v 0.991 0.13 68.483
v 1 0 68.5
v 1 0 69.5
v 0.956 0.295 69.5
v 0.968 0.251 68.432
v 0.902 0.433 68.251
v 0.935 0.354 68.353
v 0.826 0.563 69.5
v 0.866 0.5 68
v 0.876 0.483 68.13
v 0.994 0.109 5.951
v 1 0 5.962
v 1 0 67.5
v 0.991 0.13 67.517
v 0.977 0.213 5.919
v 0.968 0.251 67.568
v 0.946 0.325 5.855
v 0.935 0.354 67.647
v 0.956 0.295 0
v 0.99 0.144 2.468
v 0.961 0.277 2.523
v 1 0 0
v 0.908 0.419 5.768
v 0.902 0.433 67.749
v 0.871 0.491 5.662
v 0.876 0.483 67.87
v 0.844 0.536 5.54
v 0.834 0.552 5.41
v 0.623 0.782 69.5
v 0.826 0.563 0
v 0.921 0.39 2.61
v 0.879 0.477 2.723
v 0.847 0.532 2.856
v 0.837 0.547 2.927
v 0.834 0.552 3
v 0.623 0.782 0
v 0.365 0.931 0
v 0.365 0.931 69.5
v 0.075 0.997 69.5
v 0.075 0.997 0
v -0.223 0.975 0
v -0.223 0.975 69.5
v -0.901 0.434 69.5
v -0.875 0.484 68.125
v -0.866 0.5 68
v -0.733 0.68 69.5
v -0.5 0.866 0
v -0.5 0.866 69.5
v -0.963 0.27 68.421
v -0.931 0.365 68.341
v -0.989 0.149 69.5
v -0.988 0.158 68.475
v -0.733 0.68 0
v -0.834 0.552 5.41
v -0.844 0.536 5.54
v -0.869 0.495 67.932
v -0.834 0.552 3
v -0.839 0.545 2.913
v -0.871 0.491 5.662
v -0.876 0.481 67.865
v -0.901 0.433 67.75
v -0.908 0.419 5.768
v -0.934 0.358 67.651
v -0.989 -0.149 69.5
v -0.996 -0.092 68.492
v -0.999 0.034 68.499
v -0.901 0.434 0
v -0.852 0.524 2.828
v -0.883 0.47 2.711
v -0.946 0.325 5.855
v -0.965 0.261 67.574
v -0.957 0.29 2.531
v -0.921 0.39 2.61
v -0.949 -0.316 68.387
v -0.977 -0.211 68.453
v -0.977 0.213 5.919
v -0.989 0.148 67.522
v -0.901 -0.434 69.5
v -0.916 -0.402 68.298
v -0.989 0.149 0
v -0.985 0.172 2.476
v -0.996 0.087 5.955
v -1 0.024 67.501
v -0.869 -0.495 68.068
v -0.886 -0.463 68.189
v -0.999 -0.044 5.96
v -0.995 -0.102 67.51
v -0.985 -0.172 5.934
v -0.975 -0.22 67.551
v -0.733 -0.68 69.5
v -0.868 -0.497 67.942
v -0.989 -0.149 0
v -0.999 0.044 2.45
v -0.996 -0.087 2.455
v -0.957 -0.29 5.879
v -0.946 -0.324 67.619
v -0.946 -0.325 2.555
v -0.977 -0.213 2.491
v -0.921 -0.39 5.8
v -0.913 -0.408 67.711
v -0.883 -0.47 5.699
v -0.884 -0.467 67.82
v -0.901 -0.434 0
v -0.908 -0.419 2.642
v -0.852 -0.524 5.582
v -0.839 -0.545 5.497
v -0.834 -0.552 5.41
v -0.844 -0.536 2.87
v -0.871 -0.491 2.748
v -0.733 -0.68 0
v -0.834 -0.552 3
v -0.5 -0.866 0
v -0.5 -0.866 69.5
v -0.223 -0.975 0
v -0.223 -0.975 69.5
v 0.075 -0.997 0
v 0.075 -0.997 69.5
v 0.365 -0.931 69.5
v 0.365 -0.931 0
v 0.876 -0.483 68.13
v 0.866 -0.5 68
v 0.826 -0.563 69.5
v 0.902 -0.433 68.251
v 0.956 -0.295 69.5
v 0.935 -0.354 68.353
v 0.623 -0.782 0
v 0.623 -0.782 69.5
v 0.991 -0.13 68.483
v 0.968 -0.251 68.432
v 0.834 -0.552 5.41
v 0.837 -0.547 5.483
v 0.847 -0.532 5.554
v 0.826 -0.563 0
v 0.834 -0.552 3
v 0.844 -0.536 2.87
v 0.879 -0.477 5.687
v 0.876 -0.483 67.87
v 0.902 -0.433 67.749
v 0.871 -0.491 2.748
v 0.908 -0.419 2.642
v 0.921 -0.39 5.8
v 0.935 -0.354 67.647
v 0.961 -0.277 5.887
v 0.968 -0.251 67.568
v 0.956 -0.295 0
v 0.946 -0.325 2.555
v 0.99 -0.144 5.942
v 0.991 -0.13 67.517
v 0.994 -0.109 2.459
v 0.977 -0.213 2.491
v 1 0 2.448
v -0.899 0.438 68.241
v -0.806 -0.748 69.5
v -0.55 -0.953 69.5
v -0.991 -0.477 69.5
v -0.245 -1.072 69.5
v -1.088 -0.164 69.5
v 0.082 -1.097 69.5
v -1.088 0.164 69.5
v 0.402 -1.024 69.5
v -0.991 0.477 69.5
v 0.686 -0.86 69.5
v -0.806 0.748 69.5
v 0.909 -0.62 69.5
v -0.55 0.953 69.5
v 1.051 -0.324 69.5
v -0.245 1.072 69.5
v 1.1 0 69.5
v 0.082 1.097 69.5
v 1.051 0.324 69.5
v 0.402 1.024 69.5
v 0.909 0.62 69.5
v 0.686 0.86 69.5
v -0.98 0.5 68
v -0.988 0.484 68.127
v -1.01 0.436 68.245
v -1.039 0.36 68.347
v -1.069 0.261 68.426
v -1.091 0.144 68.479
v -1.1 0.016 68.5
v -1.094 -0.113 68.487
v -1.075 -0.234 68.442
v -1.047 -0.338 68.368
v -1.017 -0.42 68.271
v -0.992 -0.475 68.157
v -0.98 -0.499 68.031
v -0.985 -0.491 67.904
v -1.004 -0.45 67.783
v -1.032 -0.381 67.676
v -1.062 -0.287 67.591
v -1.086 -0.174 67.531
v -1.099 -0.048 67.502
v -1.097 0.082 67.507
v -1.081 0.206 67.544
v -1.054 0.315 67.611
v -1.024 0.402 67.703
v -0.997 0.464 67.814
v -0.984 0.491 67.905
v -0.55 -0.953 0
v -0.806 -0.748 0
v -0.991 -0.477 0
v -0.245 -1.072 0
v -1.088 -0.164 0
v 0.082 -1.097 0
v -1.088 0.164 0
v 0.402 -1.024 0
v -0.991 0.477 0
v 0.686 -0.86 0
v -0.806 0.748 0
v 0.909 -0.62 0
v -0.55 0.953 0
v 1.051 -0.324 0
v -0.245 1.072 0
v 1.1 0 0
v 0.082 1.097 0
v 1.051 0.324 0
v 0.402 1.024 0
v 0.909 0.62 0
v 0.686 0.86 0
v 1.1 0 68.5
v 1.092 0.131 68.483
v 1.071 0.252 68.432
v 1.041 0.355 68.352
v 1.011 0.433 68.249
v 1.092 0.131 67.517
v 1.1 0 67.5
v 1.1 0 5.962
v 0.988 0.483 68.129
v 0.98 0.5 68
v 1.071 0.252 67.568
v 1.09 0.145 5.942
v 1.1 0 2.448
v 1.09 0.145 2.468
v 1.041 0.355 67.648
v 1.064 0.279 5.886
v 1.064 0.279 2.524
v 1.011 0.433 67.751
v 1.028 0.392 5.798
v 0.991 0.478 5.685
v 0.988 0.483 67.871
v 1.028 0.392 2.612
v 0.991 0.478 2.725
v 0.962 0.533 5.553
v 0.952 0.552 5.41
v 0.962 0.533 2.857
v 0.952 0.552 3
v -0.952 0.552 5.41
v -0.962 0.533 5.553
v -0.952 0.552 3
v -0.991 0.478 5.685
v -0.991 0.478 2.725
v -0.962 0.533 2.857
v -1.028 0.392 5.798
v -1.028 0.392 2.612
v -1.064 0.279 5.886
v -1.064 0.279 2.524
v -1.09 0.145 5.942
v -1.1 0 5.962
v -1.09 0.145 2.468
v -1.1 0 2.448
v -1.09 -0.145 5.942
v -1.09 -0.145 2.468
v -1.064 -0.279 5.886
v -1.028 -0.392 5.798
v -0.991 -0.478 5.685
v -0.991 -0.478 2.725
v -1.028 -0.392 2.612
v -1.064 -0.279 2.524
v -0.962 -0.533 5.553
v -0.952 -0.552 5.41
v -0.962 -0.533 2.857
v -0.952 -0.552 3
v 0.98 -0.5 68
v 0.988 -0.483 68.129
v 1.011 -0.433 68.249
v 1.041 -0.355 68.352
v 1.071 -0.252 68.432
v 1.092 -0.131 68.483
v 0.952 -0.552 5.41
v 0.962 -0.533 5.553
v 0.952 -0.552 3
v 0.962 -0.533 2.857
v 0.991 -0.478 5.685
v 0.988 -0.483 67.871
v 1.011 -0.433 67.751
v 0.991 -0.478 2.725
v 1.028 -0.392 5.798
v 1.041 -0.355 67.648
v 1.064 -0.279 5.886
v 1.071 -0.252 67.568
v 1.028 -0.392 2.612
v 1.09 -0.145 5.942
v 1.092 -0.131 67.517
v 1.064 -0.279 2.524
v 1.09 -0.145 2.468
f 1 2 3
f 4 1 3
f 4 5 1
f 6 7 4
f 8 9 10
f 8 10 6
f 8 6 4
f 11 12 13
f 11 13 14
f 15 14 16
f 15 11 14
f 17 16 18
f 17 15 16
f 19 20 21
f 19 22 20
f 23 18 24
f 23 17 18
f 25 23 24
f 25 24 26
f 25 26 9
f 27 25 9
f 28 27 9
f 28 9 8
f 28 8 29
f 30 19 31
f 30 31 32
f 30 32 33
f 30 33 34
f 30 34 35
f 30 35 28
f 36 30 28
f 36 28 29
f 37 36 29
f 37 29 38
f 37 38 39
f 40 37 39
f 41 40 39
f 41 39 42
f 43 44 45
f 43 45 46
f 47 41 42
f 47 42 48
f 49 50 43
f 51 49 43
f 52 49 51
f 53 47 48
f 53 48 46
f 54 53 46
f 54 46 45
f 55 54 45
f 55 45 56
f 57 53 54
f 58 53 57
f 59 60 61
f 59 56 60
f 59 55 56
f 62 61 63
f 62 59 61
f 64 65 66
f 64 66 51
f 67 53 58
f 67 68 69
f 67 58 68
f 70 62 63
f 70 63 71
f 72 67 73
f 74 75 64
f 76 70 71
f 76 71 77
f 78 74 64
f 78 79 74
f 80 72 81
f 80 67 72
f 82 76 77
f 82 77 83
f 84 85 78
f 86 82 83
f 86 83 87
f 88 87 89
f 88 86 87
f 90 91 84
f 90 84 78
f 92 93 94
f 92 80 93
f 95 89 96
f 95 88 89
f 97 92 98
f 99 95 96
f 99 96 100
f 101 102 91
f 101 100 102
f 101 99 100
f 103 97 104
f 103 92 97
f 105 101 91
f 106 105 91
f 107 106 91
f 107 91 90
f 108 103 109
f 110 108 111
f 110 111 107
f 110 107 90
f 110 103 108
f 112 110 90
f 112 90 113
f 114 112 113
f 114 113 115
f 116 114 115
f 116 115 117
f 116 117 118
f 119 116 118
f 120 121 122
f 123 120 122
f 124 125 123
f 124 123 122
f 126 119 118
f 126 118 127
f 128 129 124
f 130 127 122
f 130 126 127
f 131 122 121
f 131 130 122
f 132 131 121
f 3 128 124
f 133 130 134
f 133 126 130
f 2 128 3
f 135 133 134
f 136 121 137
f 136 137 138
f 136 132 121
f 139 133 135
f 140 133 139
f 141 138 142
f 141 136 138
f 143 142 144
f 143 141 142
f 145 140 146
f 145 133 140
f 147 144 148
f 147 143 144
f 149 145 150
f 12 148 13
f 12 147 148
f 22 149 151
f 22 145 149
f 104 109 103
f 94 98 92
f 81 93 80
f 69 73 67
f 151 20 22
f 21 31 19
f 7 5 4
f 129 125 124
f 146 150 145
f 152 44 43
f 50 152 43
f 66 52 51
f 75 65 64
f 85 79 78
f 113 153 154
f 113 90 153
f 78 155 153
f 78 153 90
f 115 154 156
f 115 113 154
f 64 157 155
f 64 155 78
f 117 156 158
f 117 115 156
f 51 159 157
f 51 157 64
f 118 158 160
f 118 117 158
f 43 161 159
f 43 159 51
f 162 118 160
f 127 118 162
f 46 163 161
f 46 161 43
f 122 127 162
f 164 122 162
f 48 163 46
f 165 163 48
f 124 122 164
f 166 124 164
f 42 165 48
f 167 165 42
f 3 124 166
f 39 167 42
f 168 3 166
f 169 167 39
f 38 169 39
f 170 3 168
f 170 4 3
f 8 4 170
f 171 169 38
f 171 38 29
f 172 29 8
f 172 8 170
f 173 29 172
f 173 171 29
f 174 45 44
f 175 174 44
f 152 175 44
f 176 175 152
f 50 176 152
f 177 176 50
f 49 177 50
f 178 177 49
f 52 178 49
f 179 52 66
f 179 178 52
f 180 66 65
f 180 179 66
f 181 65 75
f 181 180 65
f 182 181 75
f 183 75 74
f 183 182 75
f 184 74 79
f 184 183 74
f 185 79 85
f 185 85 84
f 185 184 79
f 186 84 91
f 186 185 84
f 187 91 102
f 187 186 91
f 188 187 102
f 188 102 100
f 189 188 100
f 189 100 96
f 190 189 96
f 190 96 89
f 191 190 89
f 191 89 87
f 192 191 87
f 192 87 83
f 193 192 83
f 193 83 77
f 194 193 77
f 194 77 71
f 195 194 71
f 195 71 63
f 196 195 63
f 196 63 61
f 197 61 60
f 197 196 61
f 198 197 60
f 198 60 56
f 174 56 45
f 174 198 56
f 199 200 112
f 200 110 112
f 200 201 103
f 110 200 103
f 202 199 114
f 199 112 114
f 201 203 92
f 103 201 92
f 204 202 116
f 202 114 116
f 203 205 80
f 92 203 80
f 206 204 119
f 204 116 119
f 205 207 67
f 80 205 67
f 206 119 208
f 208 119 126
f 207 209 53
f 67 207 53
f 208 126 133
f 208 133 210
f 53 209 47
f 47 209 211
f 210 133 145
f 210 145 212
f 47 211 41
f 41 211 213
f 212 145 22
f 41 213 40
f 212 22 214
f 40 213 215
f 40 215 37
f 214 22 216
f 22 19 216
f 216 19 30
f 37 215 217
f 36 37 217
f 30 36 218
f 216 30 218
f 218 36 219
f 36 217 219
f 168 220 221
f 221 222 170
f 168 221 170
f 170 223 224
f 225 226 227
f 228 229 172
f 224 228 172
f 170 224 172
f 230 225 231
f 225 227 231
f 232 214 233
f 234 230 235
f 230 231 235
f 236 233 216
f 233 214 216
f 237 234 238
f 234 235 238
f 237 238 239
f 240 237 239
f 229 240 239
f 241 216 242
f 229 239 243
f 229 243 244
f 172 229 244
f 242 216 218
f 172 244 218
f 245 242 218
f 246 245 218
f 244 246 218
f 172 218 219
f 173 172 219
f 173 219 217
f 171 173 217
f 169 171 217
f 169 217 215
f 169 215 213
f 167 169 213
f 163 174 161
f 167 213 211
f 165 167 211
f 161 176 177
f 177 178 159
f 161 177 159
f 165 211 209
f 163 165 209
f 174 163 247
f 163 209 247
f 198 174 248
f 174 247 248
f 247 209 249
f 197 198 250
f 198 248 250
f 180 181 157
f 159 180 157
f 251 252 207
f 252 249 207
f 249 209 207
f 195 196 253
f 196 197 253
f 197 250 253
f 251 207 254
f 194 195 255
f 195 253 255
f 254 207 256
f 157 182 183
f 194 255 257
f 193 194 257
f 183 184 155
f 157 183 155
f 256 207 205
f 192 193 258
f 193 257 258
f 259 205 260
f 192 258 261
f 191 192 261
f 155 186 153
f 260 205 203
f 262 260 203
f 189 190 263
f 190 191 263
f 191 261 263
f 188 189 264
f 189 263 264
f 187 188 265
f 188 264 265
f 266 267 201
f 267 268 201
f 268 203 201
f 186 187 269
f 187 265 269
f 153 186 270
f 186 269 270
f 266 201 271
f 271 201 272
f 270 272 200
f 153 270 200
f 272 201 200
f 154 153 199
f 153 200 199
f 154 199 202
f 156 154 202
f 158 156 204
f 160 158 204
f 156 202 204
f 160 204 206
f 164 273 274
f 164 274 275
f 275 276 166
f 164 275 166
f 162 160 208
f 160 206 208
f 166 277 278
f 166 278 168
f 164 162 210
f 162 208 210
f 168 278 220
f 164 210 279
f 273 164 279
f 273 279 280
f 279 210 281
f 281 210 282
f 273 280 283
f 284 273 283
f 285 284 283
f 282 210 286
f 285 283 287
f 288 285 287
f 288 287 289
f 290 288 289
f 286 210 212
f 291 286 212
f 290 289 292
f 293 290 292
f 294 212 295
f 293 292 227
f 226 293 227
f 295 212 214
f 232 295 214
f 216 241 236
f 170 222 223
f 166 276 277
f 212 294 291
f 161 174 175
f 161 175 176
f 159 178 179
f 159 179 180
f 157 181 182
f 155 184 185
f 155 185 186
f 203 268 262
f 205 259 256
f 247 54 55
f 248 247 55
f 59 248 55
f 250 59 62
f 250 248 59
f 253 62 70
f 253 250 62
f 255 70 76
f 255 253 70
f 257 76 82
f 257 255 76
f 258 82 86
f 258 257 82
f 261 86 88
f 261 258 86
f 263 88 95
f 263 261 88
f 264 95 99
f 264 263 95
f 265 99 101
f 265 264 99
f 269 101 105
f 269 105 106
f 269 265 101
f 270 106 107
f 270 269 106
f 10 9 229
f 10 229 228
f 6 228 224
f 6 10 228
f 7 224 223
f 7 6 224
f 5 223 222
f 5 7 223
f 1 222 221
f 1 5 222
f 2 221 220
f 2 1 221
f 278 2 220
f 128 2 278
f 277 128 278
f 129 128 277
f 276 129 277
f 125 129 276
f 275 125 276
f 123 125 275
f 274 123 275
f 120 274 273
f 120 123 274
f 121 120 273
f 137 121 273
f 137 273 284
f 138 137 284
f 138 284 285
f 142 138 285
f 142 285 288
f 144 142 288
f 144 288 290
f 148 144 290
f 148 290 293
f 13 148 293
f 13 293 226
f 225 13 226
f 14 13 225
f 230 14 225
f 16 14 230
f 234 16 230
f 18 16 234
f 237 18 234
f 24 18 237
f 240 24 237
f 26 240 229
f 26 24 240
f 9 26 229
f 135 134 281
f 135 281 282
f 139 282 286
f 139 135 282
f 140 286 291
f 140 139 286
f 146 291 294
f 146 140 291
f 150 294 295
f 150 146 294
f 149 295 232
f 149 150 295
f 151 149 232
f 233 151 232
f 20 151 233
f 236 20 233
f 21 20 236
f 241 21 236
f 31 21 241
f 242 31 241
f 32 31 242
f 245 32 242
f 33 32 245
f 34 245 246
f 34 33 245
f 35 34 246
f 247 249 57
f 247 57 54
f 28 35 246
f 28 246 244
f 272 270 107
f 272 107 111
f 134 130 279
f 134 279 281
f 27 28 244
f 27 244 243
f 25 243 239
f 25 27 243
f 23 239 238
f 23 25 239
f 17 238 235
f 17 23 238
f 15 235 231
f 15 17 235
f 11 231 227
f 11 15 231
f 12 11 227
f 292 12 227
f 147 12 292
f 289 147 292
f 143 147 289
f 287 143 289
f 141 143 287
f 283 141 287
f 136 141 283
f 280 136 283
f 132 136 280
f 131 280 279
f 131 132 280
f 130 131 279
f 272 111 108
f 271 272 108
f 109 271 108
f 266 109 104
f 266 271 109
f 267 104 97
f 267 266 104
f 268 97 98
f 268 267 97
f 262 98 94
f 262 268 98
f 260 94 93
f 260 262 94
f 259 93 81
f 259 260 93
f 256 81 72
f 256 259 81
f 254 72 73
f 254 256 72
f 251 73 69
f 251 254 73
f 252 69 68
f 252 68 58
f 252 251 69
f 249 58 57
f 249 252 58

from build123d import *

# Parameters (mm, degrees)
F0_R     = 1.1
F0_R_2   = 1
F1_DEPTH = 69.5
F4_DEPTH = 3.03737
F5_R     = 0.5
F6_DEPTH = 25


with BuildPart() as f1:
    # F0 (on Top) → F1 (new body)
    with BuildSketch(Plane.XY):
        Circle(F0_R)
        Circle(F0_R_2, mode=Mode.SUBTRACT)
    extrude(amount=F1_DEPTH)

    # F3 (on offset) → F4 (cut)
    with BuildSketch(Plane.YZ.offset(-1.1)):
        with BuildLine():
            Line((0.551559, 2.999995), (0.551559, 5.409995))
            ThreePointArc((0.551559, 5.409995), (5e-06, 5.961565), (-0.551559, 5.410005))
            Line((-0.551559, 5.410005), (-0.551559, 3.000005))
            ThreePointArc((-0.551559, 3.000005), (-5e-06, 2.448446), (0.551559, 2.999995))
        make_face()
    extrude(amount=F4_DEPTH, mode=Mode.SUBTRACT)

    # F5 (on offset) → F6 (cut)
    with BuildSketch(Plane.YZ.offset(-1.1)):
        with Locations((0, 68)):
            Circle(F5_R)
    extrude(amount=F6_DEPTH, mode=Mode.SUBTRACT)


solid = f1.part
